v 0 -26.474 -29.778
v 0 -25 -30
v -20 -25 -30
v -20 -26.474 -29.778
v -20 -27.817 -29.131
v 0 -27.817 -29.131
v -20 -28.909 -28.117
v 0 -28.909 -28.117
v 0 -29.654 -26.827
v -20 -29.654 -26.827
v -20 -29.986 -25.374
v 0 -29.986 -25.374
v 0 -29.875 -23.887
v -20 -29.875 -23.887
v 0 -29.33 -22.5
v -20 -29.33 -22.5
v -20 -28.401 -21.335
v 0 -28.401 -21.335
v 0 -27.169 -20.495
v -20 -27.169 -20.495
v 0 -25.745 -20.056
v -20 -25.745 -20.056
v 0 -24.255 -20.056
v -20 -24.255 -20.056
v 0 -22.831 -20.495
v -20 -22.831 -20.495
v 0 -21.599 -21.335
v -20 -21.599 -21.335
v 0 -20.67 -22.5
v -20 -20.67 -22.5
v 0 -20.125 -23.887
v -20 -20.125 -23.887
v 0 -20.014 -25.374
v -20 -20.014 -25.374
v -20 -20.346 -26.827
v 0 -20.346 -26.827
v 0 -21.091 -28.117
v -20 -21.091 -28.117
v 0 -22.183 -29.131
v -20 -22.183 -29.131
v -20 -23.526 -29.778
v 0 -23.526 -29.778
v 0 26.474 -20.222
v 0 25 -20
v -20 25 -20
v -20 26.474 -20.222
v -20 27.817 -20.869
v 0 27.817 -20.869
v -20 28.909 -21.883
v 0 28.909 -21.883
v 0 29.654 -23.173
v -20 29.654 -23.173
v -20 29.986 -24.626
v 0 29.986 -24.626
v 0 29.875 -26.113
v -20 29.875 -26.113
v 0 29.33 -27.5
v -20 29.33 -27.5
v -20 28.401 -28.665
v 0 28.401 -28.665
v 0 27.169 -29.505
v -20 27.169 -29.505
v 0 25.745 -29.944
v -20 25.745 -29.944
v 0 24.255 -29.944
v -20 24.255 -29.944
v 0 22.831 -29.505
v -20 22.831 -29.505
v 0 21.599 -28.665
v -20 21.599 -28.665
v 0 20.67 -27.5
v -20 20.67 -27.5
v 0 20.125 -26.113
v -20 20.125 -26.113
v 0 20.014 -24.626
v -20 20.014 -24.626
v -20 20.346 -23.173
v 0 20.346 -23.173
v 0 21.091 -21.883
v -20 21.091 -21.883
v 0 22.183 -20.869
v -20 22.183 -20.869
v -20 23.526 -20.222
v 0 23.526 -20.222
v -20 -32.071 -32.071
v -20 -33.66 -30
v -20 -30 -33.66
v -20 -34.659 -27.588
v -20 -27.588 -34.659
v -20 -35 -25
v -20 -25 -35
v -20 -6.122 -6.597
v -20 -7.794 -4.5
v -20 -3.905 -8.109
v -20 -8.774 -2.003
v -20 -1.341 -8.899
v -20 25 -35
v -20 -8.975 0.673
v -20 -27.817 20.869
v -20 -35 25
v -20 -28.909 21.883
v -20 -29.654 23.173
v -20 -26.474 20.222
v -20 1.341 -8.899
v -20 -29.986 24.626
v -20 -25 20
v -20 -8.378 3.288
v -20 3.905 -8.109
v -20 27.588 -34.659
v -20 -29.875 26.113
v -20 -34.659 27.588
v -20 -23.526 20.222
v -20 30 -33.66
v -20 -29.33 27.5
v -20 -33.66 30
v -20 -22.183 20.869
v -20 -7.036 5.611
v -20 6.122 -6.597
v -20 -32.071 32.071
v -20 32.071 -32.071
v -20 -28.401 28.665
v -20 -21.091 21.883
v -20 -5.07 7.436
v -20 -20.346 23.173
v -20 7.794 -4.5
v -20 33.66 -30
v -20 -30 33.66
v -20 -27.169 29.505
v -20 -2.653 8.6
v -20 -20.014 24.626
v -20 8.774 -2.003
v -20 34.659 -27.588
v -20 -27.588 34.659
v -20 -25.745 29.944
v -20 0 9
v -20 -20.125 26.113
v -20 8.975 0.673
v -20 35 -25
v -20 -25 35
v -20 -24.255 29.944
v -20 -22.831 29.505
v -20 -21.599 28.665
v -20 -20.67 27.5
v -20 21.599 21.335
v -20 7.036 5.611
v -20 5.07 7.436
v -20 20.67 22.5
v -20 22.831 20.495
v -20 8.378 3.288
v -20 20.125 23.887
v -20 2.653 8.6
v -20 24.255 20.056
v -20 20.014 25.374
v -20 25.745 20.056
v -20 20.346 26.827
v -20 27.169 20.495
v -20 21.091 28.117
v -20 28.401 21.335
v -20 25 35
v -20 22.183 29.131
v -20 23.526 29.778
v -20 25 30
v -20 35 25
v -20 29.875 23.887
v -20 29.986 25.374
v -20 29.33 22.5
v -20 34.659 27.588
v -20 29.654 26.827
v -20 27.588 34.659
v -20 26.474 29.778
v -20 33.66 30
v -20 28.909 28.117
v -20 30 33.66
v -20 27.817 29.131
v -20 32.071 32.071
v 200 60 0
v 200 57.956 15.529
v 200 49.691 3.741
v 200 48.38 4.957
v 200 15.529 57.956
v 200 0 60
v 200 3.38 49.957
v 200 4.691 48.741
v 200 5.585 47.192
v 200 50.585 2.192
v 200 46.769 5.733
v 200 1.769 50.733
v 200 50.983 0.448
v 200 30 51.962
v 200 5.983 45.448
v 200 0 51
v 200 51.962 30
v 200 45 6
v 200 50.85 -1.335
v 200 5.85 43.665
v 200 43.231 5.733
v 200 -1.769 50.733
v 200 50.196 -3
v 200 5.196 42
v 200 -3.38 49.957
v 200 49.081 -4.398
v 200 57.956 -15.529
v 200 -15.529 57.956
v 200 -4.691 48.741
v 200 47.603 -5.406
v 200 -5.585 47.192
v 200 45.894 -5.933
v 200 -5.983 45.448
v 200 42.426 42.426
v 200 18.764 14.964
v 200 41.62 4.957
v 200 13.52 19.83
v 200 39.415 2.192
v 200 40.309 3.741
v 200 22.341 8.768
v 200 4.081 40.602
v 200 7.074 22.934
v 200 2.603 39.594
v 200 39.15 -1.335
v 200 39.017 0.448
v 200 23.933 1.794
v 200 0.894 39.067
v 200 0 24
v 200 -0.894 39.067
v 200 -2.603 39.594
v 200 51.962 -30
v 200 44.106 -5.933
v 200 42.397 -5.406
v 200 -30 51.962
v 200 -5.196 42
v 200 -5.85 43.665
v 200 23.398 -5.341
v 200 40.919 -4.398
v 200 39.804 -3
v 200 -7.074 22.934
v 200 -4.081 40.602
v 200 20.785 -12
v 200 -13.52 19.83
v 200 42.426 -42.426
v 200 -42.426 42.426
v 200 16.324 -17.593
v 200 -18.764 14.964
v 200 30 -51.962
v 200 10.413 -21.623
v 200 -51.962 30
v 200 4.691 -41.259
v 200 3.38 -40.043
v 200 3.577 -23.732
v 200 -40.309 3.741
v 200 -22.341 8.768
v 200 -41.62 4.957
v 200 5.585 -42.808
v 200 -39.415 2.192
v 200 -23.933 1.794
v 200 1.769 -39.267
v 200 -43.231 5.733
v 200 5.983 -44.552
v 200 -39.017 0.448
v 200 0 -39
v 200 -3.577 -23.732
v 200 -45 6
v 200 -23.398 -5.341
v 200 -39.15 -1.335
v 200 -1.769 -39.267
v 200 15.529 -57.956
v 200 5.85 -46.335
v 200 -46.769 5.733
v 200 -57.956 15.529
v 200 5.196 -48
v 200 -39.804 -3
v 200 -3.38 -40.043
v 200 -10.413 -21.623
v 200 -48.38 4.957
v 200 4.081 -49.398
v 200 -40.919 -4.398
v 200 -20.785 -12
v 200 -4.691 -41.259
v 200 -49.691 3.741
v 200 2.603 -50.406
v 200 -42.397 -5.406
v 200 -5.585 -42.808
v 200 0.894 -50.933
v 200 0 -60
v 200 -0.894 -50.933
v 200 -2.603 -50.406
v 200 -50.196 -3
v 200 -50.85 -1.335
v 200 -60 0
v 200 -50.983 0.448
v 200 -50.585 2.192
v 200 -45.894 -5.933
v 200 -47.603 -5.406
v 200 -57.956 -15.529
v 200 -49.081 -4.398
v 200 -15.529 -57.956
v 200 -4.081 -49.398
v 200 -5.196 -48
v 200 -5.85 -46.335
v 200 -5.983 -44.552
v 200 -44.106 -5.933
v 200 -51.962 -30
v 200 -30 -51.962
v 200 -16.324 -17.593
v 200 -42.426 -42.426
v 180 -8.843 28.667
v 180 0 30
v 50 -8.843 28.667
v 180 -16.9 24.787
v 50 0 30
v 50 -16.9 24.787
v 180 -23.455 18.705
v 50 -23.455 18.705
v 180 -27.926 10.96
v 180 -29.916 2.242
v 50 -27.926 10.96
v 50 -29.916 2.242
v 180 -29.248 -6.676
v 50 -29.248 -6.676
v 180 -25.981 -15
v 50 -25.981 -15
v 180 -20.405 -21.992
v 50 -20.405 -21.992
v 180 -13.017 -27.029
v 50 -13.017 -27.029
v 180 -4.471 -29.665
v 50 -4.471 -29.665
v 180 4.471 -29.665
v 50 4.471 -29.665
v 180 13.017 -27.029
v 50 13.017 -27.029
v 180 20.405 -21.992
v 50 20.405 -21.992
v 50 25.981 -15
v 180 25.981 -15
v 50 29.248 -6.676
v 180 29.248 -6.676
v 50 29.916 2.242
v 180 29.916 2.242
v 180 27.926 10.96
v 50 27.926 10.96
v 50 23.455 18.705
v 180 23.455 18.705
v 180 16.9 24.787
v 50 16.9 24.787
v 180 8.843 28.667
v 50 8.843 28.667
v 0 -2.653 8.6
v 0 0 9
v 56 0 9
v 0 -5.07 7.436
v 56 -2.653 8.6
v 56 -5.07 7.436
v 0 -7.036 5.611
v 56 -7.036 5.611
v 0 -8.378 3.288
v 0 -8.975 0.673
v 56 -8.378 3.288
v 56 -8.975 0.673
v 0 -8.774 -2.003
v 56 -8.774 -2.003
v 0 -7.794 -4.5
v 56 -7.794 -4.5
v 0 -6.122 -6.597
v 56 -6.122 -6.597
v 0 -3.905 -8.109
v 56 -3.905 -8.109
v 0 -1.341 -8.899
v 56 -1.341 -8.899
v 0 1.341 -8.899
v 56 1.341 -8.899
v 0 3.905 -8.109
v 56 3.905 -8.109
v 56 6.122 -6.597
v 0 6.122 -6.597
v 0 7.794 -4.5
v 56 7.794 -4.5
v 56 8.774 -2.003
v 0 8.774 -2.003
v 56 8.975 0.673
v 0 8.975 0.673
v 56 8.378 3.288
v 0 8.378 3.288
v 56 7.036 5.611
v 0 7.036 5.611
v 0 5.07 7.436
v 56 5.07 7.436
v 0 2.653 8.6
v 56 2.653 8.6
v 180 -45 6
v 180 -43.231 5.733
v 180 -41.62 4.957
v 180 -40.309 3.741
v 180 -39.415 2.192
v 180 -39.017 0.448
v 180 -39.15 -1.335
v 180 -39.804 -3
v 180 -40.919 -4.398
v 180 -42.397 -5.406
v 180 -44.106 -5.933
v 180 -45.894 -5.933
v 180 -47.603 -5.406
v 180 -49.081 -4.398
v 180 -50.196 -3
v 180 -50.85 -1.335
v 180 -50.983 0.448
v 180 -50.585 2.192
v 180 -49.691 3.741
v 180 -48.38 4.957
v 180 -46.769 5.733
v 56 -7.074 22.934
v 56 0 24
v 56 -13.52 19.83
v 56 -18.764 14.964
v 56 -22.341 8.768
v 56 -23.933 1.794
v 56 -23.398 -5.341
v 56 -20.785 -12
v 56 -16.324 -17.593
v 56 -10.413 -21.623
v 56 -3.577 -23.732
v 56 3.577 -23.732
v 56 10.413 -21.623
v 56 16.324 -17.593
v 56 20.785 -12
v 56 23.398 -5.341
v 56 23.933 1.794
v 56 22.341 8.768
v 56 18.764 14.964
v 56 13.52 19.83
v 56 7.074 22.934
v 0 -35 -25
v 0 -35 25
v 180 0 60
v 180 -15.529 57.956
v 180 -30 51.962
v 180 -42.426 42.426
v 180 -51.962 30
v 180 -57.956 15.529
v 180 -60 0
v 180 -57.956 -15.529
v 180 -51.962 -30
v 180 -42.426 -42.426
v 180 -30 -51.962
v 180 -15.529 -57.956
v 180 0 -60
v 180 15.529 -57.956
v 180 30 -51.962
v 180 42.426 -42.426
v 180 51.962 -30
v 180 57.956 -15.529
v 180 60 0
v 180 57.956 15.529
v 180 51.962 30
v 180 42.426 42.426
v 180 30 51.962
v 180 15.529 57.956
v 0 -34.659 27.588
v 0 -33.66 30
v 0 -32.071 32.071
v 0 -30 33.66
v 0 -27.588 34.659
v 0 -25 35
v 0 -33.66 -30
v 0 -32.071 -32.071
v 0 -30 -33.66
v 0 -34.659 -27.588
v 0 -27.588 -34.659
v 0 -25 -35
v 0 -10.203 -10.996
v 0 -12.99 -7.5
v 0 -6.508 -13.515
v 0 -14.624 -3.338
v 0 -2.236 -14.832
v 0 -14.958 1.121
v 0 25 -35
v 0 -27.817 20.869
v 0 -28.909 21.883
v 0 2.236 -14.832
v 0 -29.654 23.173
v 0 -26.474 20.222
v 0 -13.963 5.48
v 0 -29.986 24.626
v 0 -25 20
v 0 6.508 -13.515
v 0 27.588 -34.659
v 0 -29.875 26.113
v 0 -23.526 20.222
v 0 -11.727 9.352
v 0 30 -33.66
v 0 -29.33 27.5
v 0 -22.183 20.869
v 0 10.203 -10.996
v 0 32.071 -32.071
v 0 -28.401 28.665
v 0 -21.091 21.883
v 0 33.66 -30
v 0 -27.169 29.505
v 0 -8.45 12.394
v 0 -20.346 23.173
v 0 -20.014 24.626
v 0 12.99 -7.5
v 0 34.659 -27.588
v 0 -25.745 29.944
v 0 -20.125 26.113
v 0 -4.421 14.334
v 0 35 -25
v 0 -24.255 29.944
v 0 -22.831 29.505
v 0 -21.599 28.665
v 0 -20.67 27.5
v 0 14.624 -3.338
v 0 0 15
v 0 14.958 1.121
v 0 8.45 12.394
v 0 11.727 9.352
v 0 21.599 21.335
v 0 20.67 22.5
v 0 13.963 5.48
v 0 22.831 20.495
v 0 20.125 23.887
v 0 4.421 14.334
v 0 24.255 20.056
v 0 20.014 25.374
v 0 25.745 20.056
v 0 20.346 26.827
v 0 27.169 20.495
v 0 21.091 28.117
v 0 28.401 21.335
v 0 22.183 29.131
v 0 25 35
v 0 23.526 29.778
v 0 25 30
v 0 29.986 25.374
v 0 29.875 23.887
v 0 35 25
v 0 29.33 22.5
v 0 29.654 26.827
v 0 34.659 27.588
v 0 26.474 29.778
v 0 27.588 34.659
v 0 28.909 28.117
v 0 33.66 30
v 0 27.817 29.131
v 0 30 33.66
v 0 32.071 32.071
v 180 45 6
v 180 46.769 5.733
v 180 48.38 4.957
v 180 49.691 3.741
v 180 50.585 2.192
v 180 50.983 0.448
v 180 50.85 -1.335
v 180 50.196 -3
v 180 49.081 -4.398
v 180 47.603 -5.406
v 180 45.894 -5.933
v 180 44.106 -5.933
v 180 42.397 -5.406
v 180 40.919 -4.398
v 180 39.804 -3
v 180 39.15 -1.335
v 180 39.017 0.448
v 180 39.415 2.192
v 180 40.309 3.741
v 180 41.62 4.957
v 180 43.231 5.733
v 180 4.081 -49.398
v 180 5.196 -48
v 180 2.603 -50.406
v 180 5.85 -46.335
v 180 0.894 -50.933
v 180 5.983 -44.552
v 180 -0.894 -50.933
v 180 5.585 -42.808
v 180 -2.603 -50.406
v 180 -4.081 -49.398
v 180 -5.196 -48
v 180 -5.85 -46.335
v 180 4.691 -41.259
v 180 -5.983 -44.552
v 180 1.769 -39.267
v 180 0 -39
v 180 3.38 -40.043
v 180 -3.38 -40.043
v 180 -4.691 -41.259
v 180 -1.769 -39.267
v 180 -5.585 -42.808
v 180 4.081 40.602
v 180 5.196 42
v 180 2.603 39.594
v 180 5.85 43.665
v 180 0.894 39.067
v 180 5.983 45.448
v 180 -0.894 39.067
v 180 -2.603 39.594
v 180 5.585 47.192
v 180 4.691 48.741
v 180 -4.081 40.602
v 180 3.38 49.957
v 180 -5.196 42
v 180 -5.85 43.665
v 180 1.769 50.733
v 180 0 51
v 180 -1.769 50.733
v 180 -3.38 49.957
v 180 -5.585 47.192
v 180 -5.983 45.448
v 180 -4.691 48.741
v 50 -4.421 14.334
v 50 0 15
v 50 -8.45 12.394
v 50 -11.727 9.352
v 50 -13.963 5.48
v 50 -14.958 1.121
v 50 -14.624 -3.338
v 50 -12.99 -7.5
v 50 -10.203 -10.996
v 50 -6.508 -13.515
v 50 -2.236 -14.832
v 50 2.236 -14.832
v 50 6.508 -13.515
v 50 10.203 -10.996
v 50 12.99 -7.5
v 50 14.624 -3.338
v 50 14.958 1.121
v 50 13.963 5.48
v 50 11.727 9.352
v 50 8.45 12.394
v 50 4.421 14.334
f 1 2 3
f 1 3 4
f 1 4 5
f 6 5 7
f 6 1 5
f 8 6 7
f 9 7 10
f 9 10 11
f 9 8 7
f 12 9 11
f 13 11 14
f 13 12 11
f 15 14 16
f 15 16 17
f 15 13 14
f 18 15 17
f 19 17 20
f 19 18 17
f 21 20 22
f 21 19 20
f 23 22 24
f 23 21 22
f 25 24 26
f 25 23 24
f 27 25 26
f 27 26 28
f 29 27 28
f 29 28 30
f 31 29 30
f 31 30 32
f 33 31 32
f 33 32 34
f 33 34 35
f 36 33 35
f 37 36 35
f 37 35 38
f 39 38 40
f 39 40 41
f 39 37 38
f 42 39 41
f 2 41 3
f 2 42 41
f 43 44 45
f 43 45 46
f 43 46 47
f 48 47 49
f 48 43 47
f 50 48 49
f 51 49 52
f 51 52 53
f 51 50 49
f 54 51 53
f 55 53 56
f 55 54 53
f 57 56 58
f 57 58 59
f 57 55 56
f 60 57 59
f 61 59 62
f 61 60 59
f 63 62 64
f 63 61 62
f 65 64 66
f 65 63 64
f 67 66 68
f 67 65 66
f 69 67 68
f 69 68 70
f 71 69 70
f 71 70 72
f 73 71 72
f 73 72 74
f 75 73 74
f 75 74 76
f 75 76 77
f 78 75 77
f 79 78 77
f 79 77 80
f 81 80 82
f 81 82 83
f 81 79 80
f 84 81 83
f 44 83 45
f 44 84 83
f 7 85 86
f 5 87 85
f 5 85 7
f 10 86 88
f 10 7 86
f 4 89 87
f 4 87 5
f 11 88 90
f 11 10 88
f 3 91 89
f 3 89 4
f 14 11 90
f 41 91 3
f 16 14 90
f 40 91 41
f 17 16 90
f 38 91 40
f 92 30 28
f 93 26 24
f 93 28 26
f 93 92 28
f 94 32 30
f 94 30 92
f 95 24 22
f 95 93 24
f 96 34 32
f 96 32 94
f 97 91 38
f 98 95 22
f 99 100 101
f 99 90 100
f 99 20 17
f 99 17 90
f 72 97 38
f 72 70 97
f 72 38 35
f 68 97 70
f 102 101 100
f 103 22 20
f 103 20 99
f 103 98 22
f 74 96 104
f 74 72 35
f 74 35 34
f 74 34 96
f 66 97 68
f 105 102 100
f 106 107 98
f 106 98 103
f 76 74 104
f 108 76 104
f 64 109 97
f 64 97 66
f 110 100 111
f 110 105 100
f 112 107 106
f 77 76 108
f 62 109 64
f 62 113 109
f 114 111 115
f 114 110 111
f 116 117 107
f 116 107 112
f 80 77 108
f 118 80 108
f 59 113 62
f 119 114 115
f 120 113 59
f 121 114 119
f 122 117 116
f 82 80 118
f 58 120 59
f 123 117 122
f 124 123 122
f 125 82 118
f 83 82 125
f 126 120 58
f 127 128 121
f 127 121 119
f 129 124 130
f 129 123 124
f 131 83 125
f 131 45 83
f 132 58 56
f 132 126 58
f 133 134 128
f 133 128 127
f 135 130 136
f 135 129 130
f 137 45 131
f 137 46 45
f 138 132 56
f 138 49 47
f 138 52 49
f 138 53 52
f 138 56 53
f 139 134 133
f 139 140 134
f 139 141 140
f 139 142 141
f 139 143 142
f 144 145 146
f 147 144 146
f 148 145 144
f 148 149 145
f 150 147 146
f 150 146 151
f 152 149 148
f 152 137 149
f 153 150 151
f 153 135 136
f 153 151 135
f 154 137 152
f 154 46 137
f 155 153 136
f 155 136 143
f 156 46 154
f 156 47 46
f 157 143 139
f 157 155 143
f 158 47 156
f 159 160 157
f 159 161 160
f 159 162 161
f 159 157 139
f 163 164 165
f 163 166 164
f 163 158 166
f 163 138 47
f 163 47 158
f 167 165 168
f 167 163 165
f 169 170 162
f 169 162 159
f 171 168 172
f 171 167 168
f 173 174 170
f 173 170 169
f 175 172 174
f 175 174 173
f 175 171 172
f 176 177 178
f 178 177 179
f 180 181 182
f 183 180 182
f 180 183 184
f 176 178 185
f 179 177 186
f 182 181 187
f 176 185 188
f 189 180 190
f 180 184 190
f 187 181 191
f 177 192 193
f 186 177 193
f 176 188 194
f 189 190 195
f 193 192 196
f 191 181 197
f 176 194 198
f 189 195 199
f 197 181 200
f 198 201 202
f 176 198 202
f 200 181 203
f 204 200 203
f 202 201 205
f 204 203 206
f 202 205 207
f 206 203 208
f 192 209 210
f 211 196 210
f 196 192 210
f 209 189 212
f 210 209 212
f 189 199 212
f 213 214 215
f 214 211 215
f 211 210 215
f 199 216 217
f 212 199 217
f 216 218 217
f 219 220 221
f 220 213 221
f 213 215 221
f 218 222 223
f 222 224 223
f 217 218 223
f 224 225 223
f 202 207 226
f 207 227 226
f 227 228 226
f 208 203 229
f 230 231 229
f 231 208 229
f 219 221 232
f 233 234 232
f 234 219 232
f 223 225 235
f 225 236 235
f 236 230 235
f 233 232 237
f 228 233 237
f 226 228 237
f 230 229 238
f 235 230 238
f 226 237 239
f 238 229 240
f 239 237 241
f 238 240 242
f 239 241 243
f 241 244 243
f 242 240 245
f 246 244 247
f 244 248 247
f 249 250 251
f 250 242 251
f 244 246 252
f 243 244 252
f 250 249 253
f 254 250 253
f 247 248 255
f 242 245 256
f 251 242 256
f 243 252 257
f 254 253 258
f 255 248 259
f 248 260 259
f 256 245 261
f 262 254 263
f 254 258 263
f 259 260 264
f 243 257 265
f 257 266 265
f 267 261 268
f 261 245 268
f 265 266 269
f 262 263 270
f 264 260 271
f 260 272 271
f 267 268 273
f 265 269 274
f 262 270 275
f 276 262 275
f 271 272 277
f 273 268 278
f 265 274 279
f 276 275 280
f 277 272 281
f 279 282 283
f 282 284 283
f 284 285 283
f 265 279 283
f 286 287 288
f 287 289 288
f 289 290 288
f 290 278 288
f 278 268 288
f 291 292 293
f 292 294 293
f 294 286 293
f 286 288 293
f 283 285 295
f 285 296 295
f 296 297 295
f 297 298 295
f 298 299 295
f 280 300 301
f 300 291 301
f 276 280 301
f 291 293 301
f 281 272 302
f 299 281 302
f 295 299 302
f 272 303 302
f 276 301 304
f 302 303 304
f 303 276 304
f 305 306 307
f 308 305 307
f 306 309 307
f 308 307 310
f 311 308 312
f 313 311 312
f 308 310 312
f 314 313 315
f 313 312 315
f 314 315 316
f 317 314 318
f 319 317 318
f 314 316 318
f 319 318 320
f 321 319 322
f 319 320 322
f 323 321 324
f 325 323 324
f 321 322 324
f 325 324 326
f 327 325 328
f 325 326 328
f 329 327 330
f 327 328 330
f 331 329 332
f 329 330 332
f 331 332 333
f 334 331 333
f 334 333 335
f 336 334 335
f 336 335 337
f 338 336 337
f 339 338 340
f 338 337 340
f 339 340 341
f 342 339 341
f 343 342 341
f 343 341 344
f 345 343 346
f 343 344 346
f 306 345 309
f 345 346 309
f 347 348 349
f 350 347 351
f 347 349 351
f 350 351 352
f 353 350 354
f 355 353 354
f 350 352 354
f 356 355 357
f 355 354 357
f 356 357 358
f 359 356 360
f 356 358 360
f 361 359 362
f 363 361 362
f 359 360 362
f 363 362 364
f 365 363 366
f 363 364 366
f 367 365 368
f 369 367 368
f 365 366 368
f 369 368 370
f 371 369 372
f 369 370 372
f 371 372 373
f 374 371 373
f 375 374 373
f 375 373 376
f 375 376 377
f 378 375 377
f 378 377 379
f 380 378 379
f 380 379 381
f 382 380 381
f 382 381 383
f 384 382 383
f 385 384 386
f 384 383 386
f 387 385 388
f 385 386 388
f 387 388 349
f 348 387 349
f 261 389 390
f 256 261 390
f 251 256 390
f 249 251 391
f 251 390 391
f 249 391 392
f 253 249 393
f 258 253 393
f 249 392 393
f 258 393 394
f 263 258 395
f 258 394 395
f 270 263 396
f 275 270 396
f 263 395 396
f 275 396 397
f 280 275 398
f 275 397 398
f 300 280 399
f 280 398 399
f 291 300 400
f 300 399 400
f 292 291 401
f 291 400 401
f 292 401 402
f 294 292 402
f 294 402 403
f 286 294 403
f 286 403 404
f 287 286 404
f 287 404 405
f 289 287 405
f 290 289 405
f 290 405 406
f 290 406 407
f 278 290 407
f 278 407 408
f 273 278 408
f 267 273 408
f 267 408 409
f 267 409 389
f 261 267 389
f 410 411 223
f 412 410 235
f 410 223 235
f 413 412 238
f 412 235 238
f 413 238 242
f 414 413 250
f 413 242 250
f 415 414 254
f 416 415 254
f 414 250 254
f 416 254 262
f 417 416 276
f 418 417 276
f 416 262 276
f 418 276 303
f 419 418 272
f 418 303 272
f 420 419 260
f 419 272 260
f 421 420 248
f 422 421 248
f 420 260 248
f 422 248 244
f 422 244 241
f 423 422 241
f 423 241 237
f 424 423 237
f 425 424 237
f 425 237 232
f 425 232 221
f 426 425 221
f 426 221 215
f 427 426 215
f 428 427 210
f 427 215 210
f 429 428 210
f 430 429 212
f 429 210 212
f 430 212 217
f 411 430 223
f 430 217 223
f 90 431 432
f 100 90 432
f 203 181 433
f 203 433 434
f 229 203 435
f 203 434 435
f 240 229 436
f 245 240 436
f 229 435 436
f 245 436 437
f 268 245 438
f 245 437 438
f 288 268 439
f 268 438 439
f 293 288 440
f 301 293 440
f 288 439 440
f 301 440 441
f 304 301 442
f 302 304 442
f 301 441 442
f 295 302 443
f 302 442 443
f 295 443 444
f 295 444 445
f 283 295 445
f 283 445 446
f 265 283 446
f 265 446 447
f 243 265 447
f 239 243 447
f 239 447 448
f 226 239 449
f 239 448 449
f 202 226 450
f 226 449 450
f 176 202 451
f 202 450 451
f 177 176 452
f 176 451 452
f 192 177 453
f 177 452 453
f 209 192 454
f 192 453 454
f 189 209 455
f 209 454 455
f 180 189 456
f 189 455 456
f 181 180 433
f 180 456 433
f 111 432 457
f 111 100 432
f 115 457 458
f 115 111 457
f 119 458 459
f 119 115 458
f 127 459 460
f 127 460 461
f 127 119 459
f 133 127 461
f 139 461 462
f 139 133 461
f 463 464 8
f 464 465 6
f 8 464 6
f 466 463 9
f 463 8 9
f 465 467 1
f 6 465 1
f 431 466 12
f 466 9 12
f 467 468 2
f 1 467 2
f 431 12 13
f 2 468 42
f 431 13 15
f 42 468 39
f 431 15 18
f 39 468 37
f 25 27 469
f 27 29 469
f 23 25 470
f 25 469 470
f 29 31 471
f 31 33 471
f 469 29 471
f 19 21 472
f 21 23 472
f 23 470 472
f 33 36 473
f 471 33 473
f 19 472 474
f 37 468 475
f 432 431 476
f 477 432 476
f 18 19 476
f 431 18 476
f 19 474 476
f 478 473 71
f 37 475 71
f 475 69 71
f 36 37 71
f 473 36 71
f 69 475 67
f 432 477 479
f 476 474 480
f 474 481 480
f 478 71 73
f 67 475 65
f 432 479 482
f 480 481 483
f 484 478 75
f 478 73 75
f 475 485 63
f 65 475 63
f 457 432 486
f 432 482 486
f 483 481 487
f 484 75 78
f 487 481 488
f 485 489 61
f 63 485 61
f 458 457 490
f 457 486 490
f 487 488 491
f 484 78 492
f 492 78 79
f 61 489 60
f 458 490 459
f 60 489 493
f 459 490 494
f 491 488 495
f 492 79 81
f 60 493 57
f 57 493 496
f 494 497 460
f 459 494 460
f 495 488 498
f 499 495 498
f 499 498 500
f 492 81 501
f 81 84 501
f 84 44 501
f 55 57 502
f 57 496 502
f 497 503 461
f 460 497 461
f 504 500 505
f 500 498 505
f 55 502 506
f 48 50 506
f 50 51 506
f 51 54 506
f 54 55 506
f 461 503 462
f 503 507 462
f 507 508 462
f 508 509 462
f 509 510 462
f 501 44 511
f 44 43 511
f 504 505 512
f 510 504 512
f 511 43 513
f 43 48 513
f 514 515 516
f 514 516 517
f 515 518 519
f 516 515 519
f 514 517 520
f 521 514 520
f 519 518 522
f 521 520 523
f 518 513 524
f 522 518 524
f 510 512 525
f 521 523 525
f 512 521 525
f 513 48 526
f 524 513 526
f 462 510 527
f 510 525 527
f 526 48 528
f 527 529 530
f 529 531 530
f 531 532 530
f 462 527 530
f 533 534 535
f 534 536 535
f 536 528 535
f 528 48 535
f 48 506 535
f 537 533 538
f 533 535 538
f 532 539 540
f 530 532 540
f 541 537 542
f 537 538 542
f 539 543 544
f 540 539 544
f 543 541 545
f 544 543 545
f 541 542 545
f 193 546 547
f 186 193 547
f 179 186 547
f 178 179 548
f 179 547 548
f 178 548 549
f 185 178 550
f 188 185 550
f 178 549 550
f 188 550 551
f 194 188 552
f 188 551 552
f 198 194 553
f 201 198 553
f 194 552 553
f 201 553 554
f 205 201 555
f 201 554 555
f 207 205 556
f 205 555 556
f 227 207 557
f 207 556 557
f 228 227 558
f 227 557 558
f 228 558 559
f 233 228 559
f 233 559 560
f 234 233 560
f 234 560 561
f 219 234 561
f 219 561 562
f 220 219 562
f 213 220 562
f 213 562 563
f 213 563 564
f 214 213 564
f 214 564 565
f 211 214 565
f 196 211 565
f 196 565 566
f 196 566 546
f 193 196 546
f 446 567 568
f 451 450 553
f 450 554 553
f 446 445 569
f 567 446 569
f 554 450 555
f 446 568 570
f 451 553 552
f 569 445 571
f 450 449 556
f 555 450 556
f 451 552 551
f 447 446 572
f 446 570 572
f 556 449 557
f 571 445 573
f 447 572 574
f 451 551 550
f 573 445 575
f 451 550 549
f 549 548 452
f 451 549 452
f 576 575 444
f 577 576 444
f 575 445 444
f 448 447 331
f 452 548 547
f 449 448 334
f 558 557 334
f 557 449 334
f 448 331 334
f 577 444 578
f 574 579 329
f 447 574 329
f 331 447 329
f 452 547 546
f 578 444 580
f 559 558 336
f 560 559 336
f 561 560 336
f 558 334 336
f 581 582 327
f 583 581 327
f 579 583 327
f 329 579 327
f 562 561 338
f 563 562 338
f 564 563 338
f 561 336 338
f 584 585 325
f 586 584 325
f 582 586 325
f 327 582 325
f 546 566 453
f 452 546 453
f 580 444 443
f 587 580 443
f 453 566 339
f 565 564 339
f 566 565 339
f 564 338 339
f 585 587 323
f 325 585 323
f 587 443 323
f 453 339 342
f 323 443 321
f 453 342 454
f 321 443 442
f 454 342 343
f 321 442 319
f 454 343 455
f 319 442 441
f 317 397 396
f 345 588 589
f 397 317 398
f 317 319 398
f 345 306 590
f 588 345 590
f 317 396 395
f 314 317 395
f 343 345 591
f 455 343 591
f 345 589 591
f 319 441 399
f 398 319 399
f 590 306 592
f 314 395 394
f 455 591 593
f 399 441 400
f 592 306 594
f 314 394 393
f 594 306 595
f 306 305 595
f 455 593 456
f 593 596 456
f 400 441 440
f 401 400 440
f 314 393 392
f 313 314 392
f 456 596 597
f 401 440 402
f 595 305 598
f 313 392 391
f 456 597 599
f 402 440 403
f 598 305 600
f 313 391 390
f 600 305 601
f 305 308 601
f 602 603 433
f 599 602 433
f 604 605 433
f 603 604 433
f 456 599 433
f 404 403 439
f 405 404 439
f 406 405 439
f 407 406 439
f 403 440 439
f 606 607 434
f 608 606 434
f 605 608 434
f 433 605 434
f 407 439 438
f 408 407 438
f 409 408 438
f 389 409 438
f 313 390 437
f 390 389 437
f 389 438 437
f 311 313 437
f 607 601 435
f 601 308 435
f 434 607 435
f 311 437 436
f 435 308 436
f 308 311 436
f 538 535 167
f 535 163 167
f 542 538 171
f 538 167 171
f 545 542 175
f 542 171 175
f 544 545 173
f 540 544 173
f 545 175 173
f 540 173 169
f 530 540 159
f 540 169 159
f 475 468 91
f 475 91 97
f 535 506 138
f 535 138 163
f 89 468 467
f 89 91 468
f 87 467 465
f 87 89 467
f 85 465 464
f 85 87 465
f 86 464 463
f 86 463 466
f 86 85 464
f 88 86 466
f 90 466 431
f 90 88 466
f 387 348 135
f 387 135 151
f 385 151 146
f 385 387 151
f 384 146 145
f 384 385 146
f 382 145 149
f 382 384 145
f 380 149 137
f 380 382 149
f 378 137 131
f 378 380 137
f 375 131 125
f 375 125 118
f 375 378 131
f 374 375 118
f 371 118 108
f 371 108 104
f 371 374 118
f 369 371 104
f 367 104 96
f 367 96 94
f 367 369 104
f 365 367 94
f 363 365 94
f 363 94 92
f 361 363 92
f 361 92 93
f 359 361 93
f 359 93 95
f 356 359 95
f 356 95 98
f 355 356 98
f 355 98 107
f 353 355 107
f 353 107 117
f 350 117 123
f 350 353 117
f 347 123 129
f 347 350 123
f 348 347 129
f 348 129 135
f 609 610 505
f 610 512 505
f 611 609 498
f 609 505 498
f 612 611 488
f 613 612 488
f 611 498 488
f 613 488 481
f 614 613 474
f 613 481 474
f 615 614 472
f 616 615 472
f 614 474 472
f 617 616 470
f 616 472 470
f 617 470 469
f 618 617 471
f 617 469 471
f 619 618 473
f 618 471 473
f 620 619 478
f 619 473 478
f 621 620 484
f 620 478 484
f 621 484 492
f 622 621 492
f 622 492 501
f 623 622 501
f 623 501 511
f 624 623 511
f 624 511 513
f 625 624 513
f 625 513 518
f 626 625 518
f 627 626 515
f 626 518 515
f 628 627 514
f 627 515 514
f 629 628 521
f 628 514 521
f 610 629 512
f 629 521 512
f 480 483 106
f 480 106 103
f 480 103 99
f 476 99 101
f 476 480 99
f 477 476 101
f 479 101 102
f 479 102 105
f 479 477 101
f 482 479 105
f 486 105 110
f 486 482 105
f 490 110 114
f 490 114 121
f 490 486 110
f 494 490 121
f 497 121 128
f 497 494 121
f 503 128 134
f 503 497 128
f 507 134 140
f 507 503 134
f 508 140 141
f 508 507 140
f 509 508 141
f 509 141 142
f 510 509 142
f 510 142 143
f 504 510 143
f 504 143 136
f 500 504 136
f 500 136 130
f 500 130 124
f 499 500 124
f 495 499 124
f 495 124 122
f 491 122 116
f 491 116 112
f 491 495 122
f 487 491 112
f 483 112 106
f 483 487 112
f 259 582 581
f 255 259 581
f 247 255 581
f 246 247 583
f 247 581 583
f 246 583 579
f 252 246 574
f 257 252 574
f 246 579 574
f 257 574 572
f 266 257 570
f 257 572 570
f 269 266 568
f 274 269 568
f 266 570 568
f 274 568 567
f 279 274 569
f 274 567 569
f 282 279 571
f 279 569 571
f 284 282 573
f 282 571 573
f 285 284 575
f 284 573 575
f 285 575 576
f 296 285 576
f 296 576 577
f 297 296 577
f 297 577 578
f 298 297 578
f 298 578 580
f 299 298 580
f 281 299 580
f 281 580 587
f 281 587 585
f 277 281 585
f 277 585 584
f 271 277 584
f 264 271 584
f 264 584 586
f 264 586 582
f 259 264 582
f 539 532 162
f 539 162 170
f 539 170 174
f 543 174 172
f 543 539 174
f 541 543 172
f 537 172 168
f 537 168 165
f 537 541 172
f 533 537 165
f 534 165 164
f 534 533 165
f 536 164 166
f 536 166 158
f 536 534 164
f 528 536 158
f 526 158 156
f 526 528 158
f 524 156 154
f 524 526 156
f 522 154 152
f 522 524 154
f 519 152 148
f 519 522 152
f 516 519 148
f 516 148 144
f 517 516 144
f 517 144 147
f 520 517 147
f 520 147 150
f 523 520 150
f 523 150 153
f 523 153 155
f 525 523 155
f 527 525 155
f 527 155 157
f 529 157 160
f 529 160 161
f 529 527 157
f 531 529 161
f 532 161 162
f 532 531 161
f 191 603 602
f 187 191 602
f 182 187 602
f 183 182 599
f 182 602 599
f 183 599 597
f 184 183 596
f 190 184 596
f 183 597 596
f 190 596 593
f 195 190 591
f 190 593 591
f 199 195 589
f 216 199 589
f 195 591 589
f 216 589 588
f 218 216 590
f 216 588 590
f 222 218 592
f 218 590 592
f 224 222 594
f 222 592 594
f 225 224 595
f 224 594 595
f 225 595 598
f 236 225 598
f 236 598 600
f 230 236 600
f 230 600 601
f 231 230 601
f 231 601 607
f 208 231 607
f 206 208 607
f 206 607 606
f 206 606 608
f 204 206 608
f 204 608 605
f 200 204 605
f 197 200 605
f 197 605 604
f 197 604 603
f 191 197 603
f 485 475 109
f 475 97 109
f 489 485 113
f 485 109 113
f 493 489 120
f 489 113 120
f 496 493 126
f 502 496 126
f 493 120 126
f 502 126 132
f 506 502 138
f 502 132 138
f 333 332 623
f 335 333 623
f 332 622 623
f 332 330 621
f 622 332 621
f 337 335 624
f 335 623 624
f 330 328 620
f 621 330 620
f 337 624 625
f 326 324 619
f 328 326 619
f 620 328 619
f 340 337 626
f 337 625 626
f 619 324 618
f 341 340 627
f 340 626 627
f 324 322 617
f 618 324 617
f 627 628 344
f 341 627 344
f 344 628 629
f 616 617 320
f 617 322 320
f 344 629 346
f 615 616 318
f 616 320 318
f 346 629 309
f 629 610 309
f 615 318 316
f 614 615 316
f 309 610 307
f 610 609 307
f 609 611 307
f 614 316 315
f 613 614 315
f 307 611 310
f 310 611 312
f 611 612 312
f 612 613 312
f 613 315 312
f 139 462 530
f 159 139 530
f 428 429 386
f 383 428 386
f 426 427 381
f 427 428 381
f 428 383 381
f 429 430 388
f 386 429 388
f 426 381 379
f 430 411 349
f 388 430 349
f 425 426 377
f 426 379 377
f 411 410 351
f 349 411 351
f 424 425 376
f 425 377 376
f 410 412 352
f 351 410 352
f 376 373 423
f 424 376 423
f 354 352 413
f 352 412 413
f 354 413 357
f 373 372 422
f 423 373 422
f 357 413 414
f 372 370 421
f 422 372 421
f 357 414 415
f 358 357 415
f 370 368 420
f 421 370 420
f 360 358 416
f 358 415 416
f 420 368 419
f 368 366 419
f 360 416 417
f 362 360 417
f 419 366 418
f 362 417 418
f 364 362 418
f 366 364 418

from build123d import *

# Parameters (mm, degrees)
SKETCH2_W              = 70
SKETCH2_H              = 70
SKETCH2_R              = 5
SKETCH2_R_2            = 9
BOSS_EXTRUDE1_DEPTH    = 20
FILLET1_R              = 10
F_12_0MM_DOWEL_HOLE1_D = 12


with BuildPart() as part:
    # Sketch1 → Revolve1 (revolve)
    with BuildSketch(Plane.XY, mode=Mode.PRIVATE) as revolve1_sk:
        Polygon((200, 24), (200, 60), (180, 60), (180, 30), (50, 30), (50, 15), (0, 15), (0, 9), (56, 9), (56, 24), align=None)
    revolve(revolve1_sk.sketch.rotate(Axis((0, 0, 0), (1, 0, 0)), 90), axis=Axis((0, 0, 0), (1, 0, 0)))

    # Sketch2 → Boss-Extrude1 (add)
    with BuildSketch(Plane.ZY):
        Rectangle(SKETCH2_W, SKETCH2_H)
        with Locations((-25, 25)):
            Circle(SKETCH2_R, mode=Mode.SUBTRACT)
        with Locations((25, 25)):
            Circle(SKETCH2_R, mode=Mode.SUBTRACT)
        with Locations(Location((25, -25, 0), (0, 0, 180))):
            Circle(SKETCH2_R, mode=Mode.SUBTRACT)
        with Locations(Location((-25, -25, 0), (0, 0, 180))):
            Circle(SKETCH2_R, mode=Mode.SUBTRACT)
        Circle(SKETCH2_R_2, mode=Mode.SUBTRACT)
    extrude(amount=BOSS_EXTRUDE1_DEPTH)

    # Fillet1
    fillet1_edges = [part.edges().sort_by_distance(p)[0] for p in [
        (-10, -35, 35),
        (-10, 35, 35),
        (-10, 35, -35),
        (-10, -35, -35),
    ]]
    fillet(fillet1_edges, radius=FILLET1_R)

    # Ø12.0mm Dowel Hole1 (through all)
    with Locations(Plane(origin=(200, 0, 0), x_dir=(0, 0, -1), z_dir=(1, 0, 0))):
        with Locations((45, 0), (0, 45), (-45, 0), (0, -45)):
            Hole(F_12_0MM_DOWEL_HOLE1_D / 2)


solid = part.part
